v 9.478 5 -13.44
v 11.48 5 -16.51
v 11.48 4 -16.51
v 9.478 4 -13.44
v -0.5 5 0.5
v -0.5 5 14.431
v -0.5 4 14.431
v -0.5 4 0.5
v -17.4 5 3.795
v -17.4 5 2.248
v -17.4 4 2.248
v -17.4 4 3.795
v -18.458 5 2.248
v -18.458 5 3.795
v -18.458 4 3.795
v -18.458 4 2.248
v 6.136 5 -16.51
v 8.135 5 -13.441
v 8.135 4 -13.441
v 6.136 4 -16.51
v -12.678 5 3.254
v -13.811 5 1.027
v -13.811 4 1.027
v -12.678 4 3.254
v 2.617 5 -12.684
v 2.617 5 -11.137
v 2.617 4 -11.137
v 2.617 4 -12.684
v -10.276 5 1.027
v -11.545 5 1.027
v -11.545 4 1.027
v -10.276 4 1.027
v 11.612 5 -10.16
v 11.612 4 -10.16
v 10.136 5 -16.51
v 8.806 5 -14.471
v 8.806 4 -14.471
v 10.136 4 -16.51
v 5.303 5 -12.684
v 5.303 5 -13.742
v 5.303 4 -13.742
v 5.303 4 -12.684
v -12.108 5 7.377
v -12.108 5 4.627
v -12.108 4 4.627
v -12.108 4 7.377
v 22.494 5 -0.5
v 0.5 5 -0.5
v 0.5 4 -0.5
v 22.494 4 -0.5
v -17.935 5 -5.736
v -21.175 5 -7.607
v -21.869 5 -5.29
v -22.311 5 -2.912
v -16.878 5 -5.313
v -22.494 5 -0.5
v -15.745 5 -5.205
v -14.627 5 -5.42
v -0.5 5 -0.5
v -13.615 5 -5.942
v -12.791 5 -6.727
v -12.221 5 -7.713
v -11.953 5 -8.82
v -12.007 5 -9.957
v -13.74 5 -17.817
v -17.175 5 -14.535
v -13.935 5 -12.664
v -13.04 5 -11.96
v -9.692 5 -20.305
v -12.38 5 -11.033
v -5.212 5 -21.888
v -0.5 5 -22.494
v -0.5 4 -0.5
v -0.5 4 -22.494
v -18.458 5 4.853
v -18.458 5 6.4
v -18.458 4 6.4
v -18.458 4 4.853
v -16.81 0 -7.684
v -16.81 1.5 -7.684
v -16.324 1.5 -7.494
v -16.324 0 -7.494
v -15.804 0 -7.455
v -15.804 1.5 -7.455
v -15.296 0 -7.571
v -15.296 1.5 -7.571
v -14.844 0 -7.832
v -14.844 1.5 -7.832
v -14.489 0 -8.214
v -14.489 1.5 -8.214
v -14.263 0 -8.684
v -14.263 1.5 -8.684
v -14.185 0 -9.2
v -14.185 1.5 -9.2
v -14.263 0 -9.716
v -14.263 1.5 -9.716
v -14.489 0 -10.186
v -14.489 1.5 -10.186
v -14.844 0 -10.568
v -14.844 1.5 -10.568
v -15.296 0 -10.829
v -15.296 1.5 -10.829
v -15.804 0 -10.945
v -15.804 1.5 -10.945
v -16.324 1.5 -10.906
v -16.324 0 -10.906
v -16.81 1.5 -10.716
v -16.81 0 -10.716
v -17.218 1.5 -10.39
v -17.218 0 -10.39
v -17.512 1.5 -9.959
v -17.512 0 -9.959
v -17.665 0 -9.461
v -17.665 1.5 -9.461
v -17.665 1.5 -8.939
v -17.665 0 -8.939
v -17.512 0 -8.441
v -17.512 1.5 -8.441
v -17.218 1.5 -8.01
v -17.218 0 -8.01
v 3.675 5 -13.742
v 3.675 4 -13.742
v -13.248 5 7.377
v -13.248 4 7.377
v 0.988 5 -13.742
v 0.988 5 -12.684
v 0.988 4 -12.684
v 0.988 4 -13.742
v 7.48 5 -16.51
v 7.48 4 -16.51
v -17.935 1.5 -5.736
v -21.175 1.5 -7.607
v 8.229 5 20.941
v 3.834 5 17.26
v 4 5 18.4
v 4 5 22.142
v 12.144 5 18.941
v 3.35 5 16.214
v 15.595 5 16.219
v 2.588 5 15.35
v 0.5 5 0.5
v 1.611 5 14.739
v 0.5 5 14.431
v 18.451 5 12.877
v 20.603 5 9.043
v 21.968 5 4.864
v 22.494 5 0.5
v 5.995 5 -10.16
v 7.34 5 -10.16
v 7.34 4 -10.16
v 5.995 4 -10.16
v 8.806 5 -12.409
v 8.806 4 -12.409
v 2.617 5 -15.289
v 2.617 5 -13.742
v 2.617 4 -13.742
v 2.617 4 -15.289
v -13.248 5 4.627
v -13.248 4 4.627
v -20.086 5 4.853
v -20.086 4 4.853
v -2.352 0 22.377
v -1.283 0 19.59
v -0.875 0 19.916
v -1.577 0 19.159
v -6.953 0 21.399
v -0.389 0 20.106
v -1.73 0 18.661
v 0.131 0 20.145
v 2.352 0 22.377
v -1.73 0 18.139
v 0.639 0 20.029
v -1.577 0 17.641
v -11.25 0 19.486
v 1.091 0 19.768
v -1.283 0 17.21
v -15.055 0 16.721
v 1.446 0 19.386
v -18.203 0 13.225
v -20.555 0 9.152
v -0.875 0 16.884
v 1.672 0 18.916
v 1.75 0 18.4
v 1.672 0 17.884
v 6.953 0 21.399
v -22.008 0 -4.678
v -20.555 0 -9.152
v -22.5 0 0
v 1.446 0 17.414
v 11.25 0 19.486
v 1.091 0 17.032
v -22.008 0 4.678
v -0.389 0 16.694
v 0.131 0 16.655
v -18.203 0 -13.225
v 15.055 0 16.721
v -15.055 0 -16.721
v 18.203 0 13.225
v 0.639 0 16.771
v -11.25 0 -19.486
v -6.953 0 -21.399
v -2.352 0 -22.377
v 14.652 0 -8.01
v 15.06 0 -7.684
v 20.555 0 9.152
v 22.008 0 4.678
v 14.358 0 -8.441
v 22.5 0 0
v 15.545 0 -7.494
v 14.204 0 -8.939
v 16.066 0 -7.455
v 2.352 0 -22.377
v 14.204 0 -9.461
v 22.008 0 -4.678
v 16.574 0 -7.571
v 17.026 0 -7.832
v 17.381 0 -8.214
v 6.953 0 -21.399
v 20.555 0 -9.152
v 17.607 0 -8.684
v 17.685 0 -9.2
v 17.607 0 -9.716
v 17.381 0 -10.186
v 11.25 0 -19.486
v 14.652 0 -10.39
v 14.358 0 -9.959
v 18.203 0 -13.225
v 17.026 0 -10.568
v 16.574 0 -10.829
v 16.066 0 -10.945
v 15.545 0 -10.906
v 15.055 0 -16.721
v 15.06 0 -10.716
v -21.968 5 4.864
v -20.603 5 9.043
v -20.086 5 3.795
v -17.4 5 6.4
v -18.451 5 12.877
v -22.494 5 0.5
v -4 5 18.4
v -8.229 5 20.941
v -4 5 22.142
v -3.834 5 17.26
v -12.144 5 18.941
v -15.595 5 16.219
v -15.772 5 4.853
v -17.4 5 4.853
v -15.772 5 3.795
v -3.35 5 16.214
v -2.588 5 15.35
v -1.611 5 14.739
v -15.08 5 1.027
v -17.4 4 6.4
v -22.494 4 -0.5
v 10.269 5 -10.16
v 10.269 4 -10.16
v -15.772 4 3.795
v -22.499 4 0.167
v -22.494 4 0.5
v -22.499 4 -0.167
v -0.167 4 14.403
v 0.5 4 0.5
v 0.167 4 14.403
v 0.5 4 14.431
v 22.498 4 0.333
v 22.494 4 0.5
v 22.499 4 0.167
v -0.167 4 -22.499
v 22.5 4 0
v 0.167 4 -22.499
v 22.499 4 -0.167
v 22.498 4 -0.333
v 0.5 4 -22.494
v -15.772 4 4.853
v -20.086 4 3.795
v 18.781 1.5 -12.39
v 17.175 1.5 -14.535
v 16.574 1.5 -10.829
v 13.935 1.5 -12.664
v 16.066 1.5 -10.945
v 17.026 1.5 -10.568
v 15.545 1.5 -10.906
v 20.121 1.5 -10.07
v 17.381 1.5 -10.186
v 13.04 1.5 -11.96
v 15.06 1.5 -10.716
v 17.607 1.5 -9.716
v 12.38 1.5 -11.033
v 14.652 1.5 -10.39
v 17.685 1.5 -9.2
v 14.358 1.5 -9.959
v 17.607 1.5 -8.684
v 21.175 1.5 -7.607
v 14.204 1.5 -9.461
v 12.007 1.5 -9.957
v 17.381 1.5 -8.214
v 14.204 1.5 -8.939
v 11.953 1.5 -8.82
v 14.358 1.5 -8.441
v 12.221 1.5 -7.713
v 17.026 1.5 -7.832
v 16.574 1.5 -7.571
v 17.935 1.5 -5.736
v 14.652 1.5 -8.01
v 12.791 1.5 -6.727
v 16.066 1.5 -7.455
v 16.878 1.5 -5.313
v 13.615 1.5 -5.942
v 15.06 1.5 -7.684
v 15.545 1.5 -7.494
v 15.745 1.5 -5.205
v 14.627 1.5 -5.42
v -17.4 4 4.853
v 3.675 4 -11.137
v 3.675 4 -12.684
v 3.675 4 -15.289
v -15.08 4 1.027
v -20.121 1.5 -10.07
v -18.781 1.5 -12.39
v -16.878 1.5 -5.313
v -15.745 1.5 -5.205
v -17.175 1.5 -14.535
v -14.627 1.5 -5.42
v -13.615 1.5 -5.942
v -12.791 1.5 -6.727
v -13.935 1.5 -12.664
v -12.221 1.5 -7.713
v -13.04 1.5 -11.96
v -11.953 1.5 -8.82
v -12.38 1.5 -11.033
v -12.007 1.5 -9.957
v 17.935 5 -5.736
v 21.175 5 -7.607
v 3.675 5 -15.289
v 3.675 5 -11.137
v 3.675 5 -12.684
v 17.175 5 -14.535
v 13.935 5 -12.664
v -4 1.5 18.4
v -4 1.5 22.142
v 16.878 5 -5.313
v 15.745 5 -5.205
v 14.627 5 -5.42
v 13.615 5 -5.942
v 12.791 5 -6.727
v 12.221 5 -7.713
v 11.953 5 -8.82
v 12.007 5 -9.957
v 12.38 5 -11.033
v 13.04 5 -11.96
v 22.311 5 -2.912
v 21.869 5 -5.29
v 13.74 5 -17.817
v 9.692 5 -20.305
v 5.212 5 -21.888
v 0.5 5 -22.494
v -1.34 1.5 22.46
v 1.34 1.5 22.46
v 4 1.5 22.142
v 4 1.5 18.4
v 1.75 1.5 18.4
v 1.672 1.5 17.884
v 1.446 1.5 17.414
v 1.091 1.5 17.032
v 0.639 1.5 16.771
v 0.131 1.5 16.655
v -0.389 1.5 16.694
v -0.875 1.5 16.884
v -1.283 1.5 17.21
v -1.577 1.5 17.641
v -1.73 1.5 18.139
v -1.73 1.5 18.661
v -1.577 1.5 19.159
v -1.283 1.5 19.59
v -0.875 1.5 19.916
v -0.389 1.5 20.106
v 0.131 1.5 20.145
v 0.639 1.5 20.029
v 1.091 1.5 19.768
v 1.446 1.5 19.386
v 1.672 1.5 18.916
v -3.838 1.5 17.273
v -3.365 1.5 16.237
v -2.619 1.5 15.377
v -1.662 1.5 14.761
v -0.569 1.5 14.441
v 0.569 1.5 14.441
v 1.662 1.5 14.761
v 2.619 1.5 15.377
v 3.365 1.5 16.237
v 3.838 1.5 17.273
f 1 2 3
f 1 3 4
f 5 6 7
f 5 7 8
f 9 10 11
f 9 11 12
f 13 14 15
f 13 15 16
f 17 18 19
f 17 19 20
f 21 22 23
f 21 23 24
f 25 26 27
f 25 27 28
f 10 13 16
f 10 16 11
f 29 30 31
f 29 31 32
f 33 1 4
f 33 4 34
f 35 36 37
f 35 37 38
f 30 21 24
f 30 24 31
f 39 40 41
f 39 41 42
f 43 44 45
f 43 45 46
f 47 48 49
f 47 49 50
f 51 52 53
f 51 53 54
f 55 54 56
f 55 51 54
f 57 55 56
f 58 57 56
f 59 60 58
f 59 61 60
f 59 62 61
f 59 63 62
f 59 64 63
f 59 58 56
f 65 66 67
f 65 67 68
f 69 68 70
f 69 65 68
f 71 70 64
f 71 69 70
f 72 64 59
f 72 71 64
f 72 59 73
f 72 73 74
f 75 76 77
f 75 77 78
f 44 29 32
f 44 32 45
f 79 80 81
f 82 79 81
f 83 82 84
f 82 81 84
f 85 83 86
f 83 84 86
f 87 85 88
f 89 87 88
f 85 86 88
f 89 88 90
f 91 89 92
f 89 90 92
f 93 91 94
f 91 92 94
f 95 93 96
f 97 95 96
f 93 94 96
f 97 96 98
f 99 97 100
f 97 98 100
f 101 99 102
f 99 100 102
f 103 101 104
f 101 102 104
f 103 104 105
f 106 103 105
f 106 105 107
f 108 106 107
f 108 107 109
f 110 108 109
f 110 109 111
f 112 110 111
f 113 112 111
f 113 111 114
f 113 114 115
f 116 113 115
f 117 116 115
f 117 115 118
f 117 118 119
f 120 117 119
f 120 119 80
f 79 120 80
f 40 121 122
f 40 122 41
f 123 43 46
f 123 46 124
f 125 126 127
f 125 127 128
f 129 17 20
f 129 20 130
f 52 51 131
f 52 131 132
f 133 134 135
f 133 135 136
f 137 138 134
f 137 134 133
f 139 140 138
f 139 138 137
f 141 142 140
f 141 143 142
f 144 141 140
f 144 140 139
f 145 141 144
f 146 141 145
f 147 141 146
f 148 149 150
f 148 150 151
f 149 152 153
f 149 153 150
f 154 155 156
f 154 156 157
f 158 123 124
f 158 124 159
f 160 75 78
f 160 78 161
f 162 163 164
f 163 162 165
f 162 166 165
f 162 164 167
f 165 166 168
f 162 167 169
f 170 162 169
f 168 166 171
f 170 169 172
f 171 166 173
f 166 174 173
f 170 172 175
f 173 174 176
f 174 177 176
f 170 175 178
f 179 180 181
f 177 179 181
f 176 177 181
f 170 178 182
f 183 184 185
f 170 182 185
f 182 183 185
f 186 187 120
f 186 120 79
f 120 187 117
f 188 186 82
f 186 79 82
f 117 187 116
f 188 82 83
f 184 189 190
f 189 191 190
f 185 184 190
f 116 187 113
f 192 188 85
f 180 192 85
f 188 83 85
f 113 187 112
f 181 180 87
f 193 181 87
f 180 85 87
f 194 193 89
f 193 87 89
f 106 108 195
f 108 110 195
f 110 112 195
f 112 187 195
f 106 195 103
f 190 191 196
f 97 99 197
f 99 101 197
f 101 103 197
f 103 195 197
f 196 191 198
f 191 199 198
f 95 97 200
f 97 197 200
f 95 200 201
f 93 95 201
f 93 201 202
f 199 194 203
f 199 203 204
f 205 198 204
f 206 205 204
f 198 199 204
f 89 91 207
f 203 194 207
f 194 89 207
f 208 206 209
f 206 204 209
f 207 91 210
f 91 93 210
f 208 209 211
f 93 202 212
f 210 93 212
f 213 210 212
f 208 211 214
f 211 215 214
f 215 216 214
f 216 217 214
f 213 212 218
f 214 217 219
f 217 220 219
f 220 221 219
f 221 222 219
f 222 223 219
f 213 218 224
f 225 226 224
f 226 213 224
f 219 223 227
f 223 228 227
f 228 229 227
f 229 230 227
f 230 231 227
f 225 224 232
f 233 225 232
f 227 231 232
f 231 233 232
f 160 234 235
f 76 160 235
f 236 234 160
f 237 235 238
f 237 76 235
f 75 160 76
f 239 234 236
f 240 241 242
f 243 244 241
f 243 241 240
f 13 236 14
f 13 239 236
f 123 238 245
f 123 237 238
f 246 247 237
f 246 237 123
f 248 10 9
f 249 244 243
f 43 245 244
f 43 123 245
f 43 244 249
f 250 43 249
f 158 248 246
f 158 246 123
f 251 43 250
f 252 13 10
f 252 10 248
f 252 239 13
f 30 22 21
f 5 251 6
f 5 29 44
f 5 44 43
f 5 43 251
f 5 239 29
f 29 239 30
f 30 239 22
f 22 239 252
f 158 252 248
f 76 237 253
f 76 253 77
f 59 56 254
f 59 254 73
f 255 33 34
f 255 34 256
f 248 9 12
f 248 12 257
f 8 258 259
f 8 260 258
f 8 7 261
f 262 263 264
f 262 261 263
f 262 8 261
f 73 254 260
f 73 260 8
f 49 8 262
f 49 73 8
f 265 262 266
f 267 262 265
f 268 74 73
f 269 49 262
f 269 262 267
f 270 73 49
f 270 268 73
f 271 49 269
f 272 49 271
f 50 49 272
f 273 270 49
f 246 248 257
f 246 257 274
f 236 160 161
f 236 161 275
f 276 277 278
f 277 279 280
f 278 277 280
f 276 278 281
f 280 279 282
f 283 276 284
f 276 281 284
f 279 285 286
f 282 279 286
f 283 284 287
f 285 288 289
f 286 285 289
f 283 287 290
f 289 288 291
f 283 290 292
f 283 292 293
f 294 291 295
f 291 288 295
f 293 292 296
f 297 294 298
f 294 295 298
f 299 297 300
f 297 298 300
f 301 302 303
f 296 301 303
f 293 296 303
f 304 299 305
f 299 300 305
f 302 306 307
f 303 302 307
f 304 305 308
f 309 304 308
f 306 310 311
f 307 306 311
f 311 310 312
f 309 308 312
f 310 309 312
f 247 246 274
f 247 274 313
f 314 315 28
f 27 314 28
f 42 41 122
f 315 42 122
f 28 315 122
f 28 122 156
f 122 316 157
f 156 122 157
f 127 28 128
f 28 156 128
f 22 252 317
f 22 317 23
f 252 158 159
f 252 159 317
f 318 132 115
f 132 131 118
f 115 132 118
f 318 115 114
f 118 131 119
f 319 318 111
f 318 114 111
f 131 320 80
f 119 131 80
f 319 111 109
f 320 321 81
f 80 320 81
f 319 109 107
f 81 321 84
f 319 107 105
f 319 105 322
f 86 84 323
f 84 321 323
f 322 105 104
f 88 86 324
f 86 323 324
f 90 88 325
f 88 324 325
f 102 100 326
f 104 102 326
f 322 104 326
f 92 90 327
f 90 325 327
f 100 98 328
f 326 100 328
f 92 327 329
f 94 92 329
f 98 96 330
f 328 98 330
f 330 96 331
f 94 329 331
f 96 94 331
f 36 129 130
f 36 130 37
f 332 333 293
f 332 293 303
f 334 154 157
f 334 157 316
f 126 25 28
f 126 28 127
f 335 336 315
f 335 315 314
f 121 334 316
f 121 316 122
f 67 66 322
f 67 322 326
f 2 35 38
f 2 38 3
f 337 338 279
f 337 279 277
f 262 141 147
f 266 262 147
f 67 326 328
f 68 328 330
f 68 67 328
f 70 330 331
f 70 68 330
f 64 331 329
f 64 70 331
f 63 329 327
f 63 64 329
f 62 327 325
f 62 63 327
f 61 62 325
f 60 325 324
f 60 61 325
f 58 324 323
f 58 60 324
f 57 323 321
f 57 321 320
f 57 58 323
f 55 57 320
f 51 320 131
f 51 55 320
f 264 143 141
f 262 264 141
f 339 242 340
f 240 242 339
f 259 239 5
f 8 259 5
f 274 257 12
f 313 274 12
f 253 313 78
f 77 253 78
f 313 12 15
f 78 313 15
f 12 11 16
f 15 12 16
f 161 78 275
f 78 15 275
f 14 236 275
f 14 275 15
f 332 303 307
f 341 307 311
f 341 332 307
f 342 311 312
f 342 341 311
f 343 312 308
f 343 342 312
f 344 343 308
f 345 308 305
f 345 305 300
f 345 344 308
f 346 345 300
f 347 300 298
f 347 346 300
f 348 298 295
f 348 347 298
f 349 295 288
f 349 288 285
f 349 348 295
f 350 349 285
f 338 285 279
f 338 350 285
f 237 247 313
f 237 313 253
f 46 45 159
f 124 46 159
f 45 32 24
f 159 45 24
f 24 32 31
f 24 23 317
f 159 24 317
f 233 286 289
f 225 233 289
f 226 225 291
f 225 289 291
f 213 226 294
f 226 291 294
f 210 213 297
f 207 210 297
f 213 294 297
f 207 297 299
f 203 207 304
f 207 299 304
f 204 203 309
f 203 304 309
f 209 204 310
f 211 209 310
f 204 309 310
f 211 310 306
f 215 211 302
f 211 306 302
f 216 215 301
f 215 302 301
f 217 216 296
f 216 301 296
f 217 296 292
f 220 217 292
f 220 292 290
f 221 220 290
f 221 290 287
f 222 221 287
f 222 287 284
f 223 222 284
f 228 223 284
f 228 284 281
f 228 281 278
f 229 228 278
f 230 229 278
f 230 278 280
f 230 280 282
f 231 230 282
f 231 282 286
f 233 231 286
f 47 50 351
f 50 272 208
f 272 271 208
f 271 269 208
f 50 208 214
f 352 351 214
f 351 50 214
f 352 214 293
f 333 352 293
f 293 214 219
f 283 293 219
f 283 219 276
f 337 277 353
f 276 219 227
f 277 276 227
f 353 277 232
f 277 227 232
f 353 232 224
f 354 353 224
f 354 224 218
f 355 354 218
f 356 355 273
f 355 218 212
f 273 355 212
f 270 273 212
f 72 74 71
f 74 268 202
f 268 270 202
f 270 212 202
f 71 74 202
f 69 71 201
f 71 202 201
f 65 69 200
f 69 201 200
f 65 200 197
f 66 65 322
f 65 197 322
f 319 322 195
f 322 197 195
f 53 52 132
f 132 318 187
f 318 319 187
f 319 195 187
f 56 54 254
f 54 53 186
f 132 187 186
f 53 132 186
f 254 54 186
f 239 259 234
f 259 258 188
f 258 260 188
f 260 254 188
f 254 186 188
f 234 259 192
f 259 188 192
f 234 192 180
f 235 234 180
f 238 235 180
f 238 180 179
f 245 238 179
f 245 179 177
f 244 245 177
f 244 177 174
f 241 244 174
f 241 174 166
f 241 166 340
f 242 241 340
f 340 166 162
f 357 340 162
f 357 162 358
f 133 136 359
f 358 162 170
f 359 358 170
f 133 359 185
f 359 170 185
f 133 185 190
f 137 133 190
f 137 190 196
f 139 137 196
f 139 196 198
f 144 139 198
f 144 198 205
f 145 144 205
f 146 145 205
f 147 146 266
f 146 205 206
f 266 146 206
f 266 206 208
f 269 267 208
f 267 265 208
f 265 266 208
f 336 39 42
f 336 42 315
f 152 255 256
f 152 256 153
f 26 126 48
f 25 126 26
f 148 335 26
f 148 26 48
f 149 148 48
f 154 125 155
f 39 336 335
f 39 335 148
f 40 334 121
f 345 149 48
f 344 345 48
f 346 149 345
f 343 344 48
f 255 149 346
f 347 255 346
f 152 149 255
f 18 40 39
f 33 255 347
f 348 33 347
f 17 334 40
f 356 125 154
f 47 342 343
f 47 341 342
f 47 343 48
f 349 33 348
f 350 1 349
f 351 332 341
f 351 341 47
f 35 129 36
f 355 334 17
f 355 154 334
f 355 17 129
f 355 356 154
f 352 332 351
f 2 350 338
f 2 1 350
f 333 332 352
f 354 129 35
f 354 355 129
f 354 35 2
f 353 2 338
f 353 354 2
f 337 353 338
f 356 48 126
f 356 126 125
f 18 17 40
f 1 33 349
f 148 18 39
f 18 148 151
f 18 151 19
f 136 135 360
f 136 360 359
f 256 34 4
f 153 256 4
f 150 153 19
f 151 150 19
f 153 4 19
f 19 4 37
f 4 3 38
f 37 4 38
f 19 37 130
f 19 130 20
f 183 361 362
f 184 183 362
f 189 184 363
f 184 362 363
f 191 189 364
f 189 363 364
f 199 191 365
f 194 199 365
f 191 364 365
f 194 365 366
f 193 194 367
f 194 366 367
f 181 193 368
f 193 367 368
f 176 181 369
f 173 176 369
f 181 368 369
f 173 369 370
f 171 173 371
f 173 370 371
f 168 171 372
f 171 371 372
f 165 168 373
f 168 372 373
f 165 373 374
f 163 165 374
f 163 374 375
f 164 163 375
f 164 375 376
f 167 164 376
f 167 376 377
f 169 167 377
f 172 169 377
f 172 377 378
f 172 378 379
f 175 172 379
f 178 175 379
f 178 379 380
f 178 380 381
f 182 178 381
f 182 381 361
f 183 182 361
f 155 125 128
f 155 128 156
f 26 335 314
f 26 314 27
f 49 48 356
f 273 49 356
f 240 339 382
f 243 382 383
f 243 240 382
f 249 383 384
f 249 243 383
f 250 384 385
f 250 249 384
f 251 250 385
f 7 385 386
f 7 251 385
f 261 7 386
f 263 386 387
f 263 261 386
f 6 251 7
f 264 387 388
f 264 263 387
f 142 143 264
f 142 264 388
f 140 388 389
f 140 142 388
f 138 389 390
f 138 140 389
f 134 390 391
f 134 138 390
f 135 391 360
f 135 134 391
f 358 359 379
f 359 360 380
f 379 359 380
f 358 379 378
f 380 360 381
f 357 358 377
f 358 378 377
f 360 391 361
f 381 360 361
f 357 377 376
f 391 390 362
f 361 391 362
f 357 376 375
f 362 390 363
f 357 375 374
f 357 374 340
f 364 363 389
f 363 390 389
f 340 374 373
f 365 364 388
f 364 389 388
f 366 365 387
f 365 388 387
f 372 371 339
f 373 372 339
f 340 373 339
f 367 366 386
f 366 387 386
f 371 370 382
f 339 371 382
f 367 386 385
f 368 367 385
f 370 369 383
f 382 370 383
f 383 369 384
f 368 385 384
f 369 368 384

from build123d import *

# Parameters (mm, degrees)
SKETCH1_R               = 22.5
PLATE_DEPTH             = 5
OPENING_START           = 1.5
OPENING_FOR_SCREW_DEPTH = 5
SKETCH7_R               = 1.75
SCREW_HOLE_DEPTH        = 5
CIRPATTERN20_COUNT      = 3
SKETCH10_W              = 45
SKETCH10_H              = 1
SKETCH10_W_2            = 1
SKETCH10_H_2            = 45
CUT_EXTRUDE5_DEPTH      = 1
CUT_EXTRUDE6_DEPTH      = 1


with BuildPart() as part:
    # Sketch1 → plate (new body)
    with BuildSketch(Plane(origin=(0, 0, 0), x_dir=(1, 0, 0), z_dir=(0, 1, 0))):
        Circle(SKETCH1_R)
    extrude(amount=PLATE_DEPTH)

    # Sketch6 → opening for screw (cut)
    with BuildSketch(Plane(origin=(0, 5, 0), x_dir=(1, 0, 0), z_dir=(0, 1, 0)).offset(OPENING_START)):
        with BuildLine():
            Line((-4, -22.5), (-4, -18.4))
            ThreePointArc((-4, -18.4), (0, -14.4), (4, -18.4))
            Line((4, -18.4), (4, -22.5))
            ThreePointArc((4, -22.5), (0, -26.5), (-4, -22.5))
        make_face()
    opening_for_screw = extrude(amount=-OPENING_FOR_SCREW_DEPTH, mode=Mode.SUBTRACT)

    # Sketch7 → screw hole (cut)
    with BuildSketch(Plane(origin=(0, 1.5, 0), x_dir=(1, 0, 0), z_dir=(0, 1, 0))):
        with Locations((0, -18.4)):
            Circle(SKETCH7_R)
    screw_hole = extrude(amount=-SCREW_HOLE_DEPTH, mode=Mode.SUBTRACT)

    # CirPattern20: opening for screw, screw hole ×3 about axis
    cirpattern20_axis = Axis((0, 0, 0), (0, 1, 0))
    for i in range(1, CIRPATTERN20_COUNT):
        add(opening_for_screw.rotate(cirpattern20_axis, i * 360 / CIRPATTERN20_COUNT), mode=Mode.SUBTRACT)
        add(screw_hole.rotate(cirpattern20_axis, i * 360 / CIRPATTERN20_COUNT), mode=Mode.SUBTRACT)

    # Sketch10 → Cut-Extrude5 (cut)
    with BuildSketch(Plane(origin=(0, 5, 0), x_dir=(1, 0, 0), z_dir=(0, 1, 0))):
        Rectangle(SKETCH10_W, SKETCH10_H)
        Rectangle(SKETCH10_W_2, SKETCH10_H_2)
    extrude(amount=-CUT_EXTRUDE5_DEPTH, mode=Mode.SUBTRACT)

    # Sketch11 → Cut-Extrude6 (cut)
    with BuildSketch(Plane(origin=(0, 5, 0), x_dir=(1, 0, 0), z_dir=(0, 1, 0))):
        Polygon((2.616666667, 13.742425761), (2.616666667, 15.289220632), (3.675, 15.289220632), (3.675, 13.742425761), (5.303205128, 13.742425761), (5.303205128, 12.684092427), (3.675, 12.684092427), (3.675, 11.137297556), (2.616666667, 11.137297556), (2.616666667, 12.684092427), (0.988461538, 12.684092427), (0.988461538, 13.742425761), align=None)
        Polygon((6.136388221, 16.510374479), (7.479657452, 16.510374479), (8.806390224, 14.471301963), (10.135667067, 16.510374479), (11.480208333, 16.510374479), (9.47802484, 13.43968137), (11.6125, 10.160374479), (10.269230769, 10.160374479), (8.806390224, 12.409332812), (7.339733574, 10.160374479), (5.995192308, 10.160374479), (8.134755609, 13.440953405), align=None)
        Polygon((-18.458103671, -3.794817635), (-18.458103671, -2.248022763), (-17.399770338, -2.248022763), (-17.399770338, -3.794817635), (-15.771565209, -3.794817635), (-15.771565209, -4.853150968), (-17.399770338, -4.853150968), (-17.399770338, -6.39994584), (-18.458103671, -6.39994584), (-18.458103671, -4.853150968), (-20.086308799, -4.853150968), (-20.086308799, -3.794817635), align=None)
        Polygon((-15.07957803, -1.026868917), (-13.811358879, -1.026868917), (-12.677975466, -3.254202651), (-11.544592052, -1.026868917), (-10.276372902, -1.026868917), (-12.108103671, -4.626728693), (-12.108103671, -7.376868917), (-13.247847261, -7.376868917), (-13.247847261, -4.626728693), align=None)
    extrude(amount=-CUT_EXTRUDE6_DEPTH, mode=Mode.SUBTRACT)


solid = part.part
